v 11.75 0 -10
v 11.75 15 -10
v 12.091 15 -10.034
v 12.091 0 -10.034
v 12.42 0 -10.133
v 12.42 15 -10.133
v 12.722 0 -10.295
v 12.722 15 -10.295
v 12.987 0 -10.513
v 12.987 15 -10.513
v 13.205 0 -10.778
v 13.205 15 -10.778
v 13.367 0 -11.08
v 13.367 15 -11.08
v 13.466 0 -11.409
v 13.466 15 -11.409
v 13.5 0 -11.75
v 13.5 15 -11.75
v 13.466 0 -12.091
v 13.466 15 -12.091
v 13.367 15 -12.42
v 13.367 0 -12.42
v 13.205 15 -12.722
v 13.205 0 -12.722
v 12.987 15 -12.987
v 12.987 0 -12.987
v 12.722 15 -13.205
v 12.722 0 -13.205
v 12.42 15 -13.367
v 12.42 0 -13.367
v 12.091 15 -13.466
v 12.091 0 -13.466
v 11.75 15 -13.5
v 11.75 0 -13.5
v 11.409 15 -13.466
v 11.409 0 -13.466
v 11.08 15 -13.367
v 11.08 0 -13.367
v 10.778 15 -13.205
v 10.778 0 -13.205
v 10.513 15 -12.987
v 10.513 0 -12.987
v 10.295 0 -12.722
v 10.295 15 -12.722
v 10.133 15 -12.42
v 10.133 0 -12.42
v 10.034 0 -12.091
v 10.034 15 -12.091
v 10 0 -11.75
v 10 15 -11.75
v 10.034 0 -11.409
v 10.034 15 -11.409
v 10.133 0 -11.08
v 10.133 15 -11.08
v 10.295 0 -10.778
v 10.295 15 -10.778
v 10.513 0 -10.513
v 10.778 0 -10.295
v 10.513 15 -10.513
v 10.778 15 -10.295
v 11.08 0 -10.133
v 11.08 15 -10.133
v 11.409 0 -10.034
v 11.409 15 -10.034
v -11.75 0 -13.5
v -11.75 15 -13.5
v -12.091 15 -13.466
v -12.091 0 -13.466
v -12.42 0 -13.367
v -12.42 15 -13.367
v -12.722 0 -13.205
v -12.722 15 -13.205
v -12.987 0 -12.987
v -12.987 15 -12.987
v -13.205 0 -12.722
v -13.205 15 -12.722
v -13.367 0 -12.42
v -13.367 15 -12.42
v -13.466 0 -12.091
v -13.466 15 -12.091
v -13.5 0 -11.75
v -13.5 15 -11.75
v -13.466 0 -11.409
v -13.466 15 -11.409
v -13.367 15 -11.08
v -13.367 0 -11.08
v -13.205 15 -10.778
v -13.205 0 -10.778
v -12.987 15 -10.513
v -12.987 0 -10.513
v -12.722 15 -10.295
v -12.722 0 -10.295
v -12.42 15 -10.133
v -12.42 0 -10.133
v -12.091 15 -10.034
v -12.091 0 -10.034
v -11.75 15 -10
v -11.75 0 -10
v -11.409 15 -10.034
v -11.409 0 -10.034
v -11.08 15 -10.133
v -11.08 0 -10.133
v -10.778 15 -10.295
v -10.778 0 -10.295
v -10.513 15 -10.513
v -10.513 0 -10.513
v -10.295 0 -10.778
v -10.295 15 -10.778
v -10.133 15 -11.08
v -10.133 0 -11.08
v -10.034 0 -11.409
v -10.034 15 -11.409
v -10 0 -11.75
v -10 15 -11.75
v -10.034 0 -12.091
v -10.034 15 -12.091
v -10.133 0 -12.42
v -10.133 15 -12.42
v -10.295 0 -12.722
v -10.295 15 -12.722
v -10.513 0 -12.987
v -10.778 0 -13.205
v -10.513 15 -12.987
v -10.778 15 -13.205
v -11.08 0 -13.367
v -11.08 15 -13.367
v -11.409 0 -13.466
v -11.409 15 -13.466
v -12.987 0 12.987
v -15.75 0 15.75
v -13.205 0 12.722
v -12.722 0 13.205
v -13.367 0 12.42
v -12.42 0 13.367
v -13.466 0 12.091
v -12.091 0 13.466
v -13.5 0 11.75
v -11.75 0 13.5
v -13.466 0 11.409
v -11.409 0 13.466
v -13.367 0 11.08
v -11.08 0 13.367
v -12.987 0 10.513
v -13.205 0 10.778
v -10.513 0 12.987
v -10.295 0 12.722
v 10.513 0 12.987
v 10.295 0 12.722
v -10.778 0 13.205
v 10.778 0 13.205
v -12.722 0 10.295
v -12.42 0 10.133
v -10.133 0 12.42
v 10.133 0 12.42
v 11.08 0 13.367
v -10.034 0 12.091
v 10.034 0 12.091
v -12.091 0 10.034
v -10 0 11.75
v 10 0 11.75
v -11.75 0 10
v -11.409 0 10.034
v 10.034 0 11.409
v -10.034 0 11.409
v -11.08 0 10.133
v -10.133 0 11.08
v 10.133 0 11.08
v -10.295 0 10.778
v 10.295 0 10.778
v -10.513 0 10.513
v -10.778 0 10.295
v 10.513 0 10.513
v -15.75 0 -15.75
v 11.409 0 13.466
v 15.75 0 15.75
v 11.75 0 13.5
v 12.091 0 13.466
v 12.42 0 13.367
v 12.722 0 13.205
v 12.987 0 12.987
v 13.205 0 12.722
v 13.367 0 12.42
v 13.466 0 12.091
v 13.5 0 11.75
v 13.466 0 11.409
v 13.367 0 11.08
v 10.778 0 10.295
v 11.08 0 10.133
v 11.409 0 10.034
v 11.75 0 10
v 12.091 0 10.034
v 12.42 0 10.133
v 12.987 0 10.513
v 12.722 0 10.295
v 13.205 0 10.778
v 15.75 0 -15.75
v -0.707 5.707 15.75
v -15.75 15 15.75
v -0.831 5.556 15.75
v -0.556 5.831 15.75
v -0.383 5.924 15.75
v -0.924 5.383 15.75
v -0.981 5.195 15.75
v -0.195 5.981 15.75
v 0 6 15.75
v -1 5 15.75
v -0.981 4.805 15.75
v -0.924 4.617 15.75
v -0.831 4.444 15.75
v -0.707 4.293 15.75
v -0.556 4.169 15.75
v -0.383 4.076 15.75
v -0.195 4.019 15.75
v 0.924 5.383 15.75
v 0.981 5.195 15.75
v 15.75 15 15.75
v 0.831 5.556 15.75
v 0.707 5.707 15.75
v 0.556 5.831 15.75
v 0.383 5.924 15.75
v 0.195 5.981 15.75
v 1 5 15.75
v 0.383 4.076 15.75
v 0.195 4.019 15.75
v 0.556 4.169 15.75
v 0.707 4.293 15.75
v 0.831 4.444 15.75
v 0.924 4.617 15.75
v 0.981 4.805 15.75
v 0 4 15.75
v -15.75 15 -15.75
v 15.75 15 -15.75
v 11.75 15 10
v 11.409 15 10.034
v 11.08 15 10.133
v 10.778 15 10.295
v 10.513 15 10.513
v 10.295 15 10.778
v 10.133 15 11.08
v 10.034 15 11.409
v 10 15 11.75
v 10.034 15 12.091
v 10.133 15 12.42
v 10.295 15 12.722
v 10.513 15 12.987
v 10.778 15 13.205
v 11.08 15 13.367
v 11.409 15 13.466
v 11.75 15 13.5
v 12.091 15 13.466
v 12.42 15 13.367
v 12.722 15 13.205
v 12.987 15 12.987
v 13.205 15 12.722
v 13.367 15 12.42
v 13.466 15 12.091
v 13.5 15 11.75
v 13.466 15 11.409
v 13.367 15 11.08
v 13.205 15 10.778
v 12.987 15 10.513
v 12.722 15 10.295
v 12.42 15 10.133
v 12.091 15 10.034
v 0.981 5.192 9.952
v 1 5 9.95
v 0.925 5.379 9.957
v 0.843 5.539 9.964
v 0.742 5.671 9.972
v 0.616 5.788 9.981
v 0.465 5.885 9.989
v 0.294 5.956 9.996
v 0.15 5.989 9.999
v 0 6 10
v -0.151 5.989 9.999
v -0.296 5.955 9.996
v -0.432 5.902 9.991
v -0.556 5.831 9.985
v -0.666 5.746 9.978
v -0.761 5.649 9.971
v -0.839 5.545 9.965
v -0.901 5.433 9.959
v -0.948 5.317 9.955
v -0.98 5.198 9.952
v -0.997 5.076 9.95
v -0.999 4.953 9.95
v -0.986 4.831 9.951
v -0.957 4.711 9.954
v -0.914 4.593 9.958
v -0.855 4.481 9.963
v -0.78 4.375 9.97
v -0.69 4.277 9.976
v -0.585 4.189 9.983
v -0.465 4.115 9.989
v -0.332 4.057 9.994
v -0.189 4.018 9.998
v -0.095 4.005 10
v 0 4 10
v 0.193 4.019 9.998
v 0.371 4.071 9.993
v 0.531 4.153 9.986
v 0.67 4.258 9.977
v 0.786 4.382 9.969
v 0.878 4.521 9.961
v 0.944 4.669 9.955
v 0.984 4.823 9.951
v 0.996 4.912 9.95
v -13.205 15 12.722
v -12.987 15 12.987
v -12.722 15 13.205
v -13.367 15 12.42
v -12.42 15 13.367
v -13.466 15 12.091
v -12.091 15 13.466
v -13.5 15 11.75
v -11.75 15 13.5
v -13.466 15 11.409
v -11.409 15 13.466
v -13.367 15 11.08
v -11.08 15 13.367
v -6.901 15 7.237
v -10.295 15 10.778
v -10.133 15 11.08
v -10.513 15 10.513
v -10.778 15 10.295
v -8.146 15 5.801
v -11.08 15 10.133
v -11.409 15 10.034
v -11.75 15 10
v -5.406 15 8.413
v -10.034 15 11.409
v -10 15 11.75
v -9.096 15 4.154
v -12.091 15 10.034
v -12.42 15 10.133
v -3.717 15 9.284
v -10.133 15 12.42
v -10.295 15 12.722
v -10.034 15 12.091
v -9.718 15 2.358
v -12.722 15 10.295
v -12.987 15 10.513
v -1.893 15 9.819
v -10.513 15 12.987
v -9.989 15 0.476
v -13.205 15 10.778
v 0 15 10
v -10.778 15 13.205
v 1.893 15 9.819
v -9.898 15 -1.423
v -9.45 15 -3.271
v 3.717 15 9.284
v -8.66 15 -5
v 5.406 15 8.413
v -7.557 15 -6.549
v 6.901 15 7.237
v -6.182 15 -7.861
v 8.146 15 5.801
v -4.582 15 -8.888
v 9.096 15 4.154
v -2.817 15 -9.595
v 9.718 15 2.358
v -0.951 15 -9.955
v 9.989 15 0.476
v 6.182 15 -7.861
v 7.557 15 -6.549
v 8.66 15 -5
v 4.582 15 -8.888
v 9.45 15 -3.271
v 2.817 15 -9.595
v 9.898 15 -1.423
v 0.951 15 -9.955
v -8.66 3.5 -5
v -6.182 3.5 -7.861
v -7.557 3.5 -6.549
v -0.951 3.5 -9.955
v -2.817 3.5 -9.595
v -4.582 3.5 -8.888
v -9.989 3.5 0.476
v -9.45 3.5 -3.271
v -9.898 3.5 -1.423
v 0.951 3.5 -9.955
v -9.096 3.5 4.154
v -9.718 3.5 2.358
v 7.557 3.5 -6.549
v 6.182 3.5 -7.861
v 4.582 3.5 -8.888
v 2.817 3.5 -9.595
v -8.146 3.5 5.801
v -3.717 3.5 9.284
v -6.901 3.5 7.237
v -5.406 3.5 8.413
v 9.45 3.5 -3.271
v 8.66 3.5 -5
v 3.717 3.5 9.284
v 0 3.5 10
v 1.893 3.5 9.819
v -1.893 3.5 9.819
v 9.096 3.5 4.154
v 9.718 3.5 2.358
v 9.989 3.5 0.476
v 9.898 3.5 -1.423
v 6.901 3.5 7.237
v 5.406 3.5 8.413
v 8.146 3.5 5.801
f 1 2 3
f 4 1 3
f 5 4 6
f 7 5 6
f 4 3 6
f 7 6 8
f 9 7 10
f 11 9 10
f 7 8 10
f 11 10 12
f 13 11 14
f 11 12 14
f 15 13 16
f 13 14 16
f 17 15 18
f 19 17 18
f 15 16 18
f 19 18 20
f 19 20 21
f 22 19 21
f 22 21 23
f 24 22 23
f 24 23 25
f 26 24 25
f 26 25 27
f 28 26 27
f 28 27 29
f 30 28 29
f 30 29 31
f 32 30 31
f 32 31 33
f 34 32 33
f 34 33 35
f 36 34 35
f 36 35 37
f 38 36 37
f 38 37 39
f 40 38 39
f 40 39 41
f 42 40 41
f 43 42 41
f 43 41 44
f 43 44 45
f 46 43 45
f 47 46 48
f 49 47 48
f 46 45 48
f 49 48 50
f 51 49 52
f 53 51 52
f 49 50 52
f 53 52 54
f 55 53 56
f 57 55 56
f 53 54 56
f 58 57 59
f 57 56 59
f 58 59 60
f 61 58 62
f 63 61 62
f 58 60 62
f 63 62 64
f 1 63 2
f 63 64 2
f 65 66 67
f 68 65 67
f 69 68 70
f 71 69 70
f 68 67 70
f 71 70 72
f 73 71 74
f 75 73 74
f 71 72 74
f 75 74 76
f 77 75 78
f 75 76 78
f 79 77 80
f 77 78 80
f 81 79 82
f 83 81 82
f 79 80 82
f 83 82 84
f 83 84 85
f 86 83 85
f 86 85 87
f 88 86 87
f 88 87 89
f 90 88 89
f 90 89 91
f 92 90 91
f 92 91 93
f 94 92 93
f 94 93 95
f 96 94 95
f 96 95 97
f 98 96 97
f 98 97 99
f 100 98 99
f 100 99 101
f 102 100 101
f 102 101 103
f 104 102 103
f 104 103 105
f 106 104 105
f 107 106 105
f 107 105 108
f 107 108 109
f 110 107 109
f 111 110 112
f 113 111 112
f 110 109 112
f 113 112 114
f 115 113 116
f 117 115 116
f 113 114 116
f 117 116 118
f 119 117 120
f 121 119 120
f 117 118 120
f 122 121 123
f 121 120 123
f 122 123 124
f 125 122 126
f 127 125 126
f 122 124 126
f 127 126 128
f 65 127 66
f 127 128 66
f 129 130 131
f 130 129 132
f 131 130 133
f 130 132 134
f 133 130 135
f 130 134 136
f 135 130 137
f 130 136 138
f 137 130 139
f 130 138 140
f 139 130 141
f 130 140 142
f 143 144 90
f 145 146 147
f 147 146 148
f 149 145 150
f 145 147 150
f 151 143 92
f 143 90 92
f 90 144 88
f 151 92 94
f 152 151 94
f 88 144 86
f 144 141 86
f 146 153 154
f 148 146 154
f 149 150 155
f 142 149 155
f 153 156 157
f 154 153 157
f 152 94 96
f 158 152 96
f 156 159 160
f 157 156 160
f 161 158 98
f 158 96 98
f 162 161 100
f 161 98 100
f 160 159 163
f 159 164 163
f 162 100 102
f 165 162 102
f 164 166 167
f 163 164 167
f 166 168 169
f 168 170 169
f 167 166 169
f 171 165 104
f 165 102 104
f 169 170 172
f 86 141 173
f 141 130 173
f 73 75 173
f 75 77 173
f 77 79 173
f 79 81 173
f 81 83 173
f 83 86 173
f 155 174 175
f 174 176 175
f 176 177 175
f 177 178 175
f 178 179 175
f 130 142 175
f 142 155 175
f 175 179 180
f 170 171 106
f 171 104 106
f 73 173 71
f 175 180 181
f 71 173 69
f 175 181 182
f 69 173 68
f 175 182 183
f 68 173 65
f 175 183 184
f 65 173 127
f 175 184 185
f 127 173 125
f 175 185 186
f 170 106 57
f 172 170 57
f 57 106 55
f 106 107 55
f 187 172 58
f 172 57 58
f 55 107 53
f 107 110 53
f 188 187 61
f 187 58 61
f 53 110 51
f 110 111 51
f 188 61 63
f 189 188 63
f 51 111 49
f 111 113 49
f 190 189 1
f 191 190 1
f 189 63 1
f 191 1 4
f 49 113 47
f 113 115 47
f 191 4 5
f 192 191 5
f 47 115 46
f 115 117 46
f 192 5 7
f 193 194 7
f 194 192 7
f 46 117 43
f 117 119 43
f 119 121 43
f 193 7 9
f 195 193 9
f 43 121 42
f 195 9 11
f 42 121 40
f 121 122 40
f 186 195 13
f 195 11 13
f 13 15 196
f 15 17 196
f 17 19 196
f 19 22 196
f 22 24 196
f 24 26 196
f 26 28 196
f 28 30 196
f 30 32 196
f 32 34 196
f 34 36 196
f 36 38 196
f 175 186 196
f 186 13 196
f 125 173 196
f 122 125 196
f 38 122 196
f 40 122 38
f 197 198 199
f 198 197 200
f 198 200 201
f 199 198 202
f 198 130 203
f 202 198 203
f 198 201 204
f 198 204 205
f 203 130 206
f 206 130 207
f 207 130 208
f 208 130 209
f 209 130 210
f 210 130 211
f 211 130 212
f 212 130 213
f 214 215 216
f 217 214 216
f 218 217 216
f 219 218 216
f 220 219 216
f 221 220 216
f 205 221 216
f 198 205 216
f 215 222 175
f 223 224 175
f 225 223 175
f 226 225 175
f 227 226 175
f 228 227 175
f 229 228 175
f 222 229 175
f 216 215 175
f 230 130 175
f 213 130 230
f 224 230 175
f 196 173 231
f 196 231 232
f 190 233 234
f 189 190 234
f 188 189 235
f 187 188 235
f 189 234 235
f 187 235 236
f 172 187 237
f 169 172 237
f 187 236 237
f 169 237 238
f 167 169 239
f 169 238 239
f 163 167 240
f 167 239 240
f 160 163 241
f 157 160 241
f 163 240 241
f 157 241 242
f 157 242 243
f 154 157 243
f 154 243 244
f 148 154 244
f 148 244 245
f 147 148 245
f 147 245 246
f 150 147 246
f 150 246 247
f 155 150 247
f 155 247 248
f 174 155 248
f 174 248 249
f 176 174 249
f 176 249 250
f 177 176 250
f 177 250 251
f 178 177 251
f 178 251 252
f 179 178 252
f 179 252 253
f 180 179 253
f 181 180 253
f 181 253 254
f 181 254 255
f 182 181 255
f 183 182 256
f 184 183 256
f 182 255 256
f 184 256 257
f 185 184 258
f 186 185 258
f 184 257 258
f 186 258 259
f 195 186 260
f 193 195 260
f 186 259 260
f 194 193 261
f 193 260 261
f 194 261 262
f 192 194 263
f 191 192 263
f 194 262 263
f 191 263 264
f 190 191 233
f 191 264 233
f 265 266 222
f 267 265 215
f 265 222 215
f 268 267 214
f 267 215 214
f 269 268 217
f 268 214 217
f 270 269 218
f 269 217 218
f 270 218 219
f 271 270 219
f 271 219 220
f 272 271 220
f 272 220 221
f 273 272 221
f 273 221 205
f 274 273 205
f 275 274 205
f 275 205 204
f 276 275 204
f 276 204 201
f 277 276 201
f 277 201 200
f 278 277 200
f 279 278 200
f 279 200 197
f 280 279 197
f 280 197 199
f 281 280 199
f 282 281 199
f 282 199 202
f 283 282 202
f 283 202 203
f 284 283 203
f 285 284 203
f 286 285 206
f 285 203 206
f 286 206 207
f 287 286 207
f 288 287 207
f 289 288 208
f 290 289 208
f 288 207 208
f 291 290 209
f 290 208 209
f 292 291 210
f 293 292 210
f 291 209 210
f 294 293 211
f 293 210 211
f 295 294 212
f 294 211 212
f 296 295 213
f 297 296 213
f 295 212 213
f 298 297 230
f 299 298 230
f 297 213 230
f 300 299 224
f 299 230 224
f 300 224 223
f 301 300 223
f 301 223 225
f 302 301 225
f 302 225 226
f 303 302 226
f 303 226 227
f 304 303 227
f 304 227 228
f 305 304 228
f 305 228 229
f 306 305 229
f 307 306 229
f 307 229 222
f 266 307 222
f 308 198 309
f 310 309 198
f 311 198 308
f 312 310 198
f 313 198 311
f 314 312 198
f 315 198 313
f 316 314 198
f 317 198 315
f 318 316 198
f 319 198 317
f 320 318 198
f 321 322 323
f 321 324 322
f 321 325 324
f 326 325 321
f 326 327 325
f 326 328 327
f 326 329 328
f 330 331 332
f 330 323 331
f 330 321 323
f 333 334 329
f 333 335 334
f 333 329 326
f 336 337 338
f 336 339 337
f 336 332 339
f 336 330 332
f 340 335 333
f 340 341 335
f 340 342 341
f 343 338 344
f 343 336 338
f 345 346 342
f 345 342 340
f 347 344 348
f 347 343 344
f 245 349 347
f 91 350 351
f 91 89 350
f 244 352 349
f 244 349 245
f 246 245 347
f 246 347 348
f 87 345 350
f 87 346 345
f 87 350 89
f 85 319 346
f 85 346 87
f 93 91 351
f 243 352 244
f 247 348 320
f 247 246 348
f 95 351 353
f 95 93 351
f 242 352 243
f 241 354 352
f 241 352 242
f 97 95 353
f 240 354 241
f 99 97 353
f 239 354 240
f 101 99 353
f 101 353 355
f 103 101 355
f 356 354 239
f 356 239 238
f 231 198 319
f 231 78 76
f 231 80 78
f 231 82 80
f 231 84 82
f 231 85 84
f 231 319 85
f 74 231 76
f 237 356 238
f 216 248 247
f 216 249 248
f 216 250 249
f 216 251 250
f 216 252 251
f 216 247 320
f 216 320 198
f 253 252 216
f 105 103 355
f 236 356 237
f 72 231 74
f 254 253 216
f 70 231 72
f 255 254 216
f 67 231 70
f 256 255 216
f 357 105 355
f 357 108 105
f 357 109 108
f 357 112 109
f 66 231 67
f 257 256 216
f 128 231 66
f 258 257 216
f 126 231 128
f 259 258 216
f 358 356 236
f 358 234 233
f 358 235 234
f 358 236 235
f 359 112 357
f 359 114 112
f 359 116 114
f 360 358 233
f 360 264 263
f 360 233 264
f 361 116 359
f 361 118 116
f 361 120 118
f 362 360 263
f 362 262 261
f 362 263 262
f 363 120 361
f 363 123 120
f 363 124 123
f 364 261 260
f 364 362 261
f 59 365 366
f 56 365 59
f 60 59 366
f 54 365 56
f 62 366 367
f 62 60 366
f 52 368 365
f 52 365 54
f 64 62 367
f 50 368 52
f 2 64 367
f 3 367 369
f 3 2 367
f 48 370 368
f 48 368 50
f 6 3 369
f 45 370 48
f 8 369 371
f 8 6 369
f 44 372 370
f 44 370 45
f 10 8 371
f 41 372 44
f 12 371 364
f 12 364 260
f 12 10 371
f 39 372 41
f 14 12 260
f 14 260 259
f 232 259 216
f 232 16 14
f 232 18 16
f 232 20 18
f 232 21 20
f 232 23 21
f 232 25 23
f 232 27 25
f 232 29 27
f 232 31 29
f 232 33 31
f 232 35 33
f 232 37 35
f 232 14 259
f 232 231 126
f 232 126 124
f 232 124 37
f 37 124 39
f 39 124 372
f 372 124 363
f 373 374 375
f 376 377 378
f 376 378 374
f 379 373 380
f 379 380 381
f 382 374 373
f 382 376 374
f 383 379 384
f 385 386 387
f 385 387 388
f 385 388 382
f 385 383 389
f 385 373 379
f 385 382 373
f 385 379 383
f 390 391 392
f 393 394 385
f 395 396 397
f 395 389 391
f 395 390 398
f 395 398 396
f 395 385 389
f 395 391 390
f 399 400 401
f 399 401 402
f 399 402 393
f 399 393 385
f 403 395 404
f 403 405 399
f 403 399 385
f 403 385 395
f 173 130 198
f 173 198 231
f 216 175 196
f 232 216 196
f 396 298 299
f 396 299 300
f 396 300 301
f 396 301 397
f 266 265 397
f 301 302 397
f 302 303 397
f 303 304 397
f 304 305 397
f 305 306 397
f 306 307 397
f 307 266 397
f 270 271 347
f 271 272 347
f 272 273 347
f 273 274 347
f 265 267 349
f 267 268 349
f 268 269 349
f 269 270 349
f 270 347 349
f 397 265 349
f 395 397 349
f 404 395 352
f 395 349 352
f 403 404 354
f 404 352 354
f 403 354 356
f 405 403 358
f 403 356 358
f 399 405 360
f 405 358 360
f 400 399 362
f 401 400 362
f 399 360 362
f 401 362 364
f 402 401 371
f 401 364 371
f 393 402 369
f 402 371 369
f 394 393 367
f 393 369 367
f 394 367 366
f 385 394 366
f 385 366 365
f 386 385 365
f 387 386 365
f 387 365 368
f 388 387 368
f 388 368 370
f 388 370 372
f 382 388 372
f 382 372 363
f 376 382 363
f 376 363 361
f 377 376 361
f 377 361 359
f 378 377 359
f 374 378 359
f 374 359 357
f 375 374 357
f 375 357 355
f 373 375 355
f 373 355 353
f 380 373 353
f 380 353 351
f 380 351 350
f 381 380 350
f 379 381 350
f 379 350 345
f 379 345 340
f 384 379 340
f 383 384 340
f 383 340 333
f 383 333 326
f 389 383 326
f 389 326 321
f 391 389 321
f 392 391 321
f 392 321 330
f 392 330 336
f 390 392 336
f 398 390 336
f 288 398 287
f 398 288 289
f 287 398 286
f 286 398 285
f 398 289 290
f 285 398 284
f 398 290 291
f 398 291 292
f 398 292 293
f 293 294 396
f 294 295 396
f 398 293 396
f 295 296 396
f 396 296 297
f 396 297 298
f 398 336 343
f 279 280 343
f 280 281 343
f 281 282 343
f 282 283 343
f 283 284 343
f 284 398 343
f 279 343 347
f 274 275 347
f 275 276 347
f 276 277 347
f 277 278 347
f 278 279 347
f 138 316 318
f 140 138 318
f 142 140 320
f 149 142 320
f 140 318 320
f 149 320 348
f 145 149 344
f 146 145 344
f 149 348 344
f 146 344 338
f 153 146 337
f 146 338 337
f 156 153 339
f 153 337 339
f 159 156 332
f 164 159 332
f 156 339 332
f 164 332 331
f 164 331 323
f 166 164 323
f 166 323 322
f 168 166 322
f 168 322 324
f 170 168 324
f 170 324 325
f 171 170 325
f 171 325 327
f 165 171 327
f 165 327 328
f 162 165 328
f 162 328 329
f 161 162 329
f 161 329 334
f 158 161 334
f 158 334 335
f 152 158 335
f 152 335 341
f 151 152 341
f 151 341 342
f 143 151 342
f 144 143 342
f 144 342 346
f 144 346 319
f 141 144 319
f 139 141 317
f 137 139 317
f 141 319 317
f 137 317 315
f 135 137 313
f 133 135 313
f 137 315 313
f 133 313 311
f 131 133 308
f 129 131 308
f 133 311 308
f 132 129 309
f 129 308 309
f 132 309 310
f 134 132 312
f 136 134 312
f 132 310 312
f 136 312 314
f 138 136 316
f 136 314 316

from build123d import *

# Parameters (mm, degrees)
CROQUIS1_W                 = 31.5
CROQUIS1_H                 = 31.5
SALIENTE_EXTRUIR1_DEPTH    = 15
CROQUIS3_R                 = 10
CORTAR_EXTRUIR1_DEPTH      = 11.5
CROQUIS6_R                 = 1.75
CORTAR_EXTRUIR2_DEPTH      = 27.853770685
CORTAR_EXTRUIR3_REACH      = 40.279
CORTAR_EXTRUIR3_END_RADIUS = 10
CROQUIS7_R                 = 1


with BuildPart() as part:
    # Croquis1 → Saliente-Extruir1 (new body)
    with BuildSketch(Plane(origin=(0, 0, 0), x_dir=(1, 0, 0), z_dir=(0, 1, 0))):
        Rectangle(CROQUIS1_W, CROQUIS1_H)
    extrude(amount=SALIENTE_EXTRUIR1_DEPTH)

    # Croquis3 → Cortar-Extruir1 (cut)
    with BuildSketch(Plane(origin=(0, 15, 0), x_dir=(1, 0, 0), z_dir=(0, 1, 0))):
        with Locations(Location((0, 0, 0), (0, 0, 270))):
            Circle(CROQUIS3_R)
    extrude(amount=-CORTAR_EXTRUIR1_DEPTH, mode=Mode.SUBTRACT)

    # Croquis6 → Cortar-Extruir2 (cut, through all)
    with BuildSketch(Plane(origin=(0, 15, 0), x_dir=(1, 0, 0), z_dir=(0, 1, 0))):
        with Locations(Location((-11.75, -11.75, 0), (0, 0, 270))):
            Circle(CROQUIS6_R)
        with Locations(Location((11.75, -11.75, 0), (0, 0, 90))):
            Circle(CROQUIS6_R)
        with Locations(Location((11.75, 11.75, 0), (0, 0, 270))):
            Circle(CROQUIS6_R)
        with Locations(Location((-11.75, 11.75, 0), (0, 0, 90))):
            Circle(CROQUIS6_R)
    extrude(amount=-CORTAR_EXTRUIR2_DEPTH, mode=Mode.SUBTRACT)

    # Cortar-Extruir3: up to this cylinder (the profile starts outside it)
    cortar_extruir3_end = Plane(origin=(0, 5, 0), z_dir=(0, 1, 0)) * Cylinder(CORTAR_EXTRUIR3_END_RADIUS, 101.558, mode=Mode.PRIVATE)
    # Croquis7 → Cortar-Extruir3 (cut, up to the surface)
    with BuildSketch(Plane.XY.offset(15.75), mode=Mode.PRIVATE) as cortar_extruir3_sk1:
        with Locations((0, 5)):
            Circle(CROQUIS7_R)
    cortar_extruir3_tool1 = extrude(cortar_extruir3_sk1.sketch, amount=-CORTAR_EXTRUIR3_REACH, mode=Mode.PRIVATE) - cortar_extruir3_end
    add(cortar_extruir3_tool1.solids().sort_by_distance((0, 5, 15.75))[0], mode=Mode.SUBTRACT)


solid = part.part
